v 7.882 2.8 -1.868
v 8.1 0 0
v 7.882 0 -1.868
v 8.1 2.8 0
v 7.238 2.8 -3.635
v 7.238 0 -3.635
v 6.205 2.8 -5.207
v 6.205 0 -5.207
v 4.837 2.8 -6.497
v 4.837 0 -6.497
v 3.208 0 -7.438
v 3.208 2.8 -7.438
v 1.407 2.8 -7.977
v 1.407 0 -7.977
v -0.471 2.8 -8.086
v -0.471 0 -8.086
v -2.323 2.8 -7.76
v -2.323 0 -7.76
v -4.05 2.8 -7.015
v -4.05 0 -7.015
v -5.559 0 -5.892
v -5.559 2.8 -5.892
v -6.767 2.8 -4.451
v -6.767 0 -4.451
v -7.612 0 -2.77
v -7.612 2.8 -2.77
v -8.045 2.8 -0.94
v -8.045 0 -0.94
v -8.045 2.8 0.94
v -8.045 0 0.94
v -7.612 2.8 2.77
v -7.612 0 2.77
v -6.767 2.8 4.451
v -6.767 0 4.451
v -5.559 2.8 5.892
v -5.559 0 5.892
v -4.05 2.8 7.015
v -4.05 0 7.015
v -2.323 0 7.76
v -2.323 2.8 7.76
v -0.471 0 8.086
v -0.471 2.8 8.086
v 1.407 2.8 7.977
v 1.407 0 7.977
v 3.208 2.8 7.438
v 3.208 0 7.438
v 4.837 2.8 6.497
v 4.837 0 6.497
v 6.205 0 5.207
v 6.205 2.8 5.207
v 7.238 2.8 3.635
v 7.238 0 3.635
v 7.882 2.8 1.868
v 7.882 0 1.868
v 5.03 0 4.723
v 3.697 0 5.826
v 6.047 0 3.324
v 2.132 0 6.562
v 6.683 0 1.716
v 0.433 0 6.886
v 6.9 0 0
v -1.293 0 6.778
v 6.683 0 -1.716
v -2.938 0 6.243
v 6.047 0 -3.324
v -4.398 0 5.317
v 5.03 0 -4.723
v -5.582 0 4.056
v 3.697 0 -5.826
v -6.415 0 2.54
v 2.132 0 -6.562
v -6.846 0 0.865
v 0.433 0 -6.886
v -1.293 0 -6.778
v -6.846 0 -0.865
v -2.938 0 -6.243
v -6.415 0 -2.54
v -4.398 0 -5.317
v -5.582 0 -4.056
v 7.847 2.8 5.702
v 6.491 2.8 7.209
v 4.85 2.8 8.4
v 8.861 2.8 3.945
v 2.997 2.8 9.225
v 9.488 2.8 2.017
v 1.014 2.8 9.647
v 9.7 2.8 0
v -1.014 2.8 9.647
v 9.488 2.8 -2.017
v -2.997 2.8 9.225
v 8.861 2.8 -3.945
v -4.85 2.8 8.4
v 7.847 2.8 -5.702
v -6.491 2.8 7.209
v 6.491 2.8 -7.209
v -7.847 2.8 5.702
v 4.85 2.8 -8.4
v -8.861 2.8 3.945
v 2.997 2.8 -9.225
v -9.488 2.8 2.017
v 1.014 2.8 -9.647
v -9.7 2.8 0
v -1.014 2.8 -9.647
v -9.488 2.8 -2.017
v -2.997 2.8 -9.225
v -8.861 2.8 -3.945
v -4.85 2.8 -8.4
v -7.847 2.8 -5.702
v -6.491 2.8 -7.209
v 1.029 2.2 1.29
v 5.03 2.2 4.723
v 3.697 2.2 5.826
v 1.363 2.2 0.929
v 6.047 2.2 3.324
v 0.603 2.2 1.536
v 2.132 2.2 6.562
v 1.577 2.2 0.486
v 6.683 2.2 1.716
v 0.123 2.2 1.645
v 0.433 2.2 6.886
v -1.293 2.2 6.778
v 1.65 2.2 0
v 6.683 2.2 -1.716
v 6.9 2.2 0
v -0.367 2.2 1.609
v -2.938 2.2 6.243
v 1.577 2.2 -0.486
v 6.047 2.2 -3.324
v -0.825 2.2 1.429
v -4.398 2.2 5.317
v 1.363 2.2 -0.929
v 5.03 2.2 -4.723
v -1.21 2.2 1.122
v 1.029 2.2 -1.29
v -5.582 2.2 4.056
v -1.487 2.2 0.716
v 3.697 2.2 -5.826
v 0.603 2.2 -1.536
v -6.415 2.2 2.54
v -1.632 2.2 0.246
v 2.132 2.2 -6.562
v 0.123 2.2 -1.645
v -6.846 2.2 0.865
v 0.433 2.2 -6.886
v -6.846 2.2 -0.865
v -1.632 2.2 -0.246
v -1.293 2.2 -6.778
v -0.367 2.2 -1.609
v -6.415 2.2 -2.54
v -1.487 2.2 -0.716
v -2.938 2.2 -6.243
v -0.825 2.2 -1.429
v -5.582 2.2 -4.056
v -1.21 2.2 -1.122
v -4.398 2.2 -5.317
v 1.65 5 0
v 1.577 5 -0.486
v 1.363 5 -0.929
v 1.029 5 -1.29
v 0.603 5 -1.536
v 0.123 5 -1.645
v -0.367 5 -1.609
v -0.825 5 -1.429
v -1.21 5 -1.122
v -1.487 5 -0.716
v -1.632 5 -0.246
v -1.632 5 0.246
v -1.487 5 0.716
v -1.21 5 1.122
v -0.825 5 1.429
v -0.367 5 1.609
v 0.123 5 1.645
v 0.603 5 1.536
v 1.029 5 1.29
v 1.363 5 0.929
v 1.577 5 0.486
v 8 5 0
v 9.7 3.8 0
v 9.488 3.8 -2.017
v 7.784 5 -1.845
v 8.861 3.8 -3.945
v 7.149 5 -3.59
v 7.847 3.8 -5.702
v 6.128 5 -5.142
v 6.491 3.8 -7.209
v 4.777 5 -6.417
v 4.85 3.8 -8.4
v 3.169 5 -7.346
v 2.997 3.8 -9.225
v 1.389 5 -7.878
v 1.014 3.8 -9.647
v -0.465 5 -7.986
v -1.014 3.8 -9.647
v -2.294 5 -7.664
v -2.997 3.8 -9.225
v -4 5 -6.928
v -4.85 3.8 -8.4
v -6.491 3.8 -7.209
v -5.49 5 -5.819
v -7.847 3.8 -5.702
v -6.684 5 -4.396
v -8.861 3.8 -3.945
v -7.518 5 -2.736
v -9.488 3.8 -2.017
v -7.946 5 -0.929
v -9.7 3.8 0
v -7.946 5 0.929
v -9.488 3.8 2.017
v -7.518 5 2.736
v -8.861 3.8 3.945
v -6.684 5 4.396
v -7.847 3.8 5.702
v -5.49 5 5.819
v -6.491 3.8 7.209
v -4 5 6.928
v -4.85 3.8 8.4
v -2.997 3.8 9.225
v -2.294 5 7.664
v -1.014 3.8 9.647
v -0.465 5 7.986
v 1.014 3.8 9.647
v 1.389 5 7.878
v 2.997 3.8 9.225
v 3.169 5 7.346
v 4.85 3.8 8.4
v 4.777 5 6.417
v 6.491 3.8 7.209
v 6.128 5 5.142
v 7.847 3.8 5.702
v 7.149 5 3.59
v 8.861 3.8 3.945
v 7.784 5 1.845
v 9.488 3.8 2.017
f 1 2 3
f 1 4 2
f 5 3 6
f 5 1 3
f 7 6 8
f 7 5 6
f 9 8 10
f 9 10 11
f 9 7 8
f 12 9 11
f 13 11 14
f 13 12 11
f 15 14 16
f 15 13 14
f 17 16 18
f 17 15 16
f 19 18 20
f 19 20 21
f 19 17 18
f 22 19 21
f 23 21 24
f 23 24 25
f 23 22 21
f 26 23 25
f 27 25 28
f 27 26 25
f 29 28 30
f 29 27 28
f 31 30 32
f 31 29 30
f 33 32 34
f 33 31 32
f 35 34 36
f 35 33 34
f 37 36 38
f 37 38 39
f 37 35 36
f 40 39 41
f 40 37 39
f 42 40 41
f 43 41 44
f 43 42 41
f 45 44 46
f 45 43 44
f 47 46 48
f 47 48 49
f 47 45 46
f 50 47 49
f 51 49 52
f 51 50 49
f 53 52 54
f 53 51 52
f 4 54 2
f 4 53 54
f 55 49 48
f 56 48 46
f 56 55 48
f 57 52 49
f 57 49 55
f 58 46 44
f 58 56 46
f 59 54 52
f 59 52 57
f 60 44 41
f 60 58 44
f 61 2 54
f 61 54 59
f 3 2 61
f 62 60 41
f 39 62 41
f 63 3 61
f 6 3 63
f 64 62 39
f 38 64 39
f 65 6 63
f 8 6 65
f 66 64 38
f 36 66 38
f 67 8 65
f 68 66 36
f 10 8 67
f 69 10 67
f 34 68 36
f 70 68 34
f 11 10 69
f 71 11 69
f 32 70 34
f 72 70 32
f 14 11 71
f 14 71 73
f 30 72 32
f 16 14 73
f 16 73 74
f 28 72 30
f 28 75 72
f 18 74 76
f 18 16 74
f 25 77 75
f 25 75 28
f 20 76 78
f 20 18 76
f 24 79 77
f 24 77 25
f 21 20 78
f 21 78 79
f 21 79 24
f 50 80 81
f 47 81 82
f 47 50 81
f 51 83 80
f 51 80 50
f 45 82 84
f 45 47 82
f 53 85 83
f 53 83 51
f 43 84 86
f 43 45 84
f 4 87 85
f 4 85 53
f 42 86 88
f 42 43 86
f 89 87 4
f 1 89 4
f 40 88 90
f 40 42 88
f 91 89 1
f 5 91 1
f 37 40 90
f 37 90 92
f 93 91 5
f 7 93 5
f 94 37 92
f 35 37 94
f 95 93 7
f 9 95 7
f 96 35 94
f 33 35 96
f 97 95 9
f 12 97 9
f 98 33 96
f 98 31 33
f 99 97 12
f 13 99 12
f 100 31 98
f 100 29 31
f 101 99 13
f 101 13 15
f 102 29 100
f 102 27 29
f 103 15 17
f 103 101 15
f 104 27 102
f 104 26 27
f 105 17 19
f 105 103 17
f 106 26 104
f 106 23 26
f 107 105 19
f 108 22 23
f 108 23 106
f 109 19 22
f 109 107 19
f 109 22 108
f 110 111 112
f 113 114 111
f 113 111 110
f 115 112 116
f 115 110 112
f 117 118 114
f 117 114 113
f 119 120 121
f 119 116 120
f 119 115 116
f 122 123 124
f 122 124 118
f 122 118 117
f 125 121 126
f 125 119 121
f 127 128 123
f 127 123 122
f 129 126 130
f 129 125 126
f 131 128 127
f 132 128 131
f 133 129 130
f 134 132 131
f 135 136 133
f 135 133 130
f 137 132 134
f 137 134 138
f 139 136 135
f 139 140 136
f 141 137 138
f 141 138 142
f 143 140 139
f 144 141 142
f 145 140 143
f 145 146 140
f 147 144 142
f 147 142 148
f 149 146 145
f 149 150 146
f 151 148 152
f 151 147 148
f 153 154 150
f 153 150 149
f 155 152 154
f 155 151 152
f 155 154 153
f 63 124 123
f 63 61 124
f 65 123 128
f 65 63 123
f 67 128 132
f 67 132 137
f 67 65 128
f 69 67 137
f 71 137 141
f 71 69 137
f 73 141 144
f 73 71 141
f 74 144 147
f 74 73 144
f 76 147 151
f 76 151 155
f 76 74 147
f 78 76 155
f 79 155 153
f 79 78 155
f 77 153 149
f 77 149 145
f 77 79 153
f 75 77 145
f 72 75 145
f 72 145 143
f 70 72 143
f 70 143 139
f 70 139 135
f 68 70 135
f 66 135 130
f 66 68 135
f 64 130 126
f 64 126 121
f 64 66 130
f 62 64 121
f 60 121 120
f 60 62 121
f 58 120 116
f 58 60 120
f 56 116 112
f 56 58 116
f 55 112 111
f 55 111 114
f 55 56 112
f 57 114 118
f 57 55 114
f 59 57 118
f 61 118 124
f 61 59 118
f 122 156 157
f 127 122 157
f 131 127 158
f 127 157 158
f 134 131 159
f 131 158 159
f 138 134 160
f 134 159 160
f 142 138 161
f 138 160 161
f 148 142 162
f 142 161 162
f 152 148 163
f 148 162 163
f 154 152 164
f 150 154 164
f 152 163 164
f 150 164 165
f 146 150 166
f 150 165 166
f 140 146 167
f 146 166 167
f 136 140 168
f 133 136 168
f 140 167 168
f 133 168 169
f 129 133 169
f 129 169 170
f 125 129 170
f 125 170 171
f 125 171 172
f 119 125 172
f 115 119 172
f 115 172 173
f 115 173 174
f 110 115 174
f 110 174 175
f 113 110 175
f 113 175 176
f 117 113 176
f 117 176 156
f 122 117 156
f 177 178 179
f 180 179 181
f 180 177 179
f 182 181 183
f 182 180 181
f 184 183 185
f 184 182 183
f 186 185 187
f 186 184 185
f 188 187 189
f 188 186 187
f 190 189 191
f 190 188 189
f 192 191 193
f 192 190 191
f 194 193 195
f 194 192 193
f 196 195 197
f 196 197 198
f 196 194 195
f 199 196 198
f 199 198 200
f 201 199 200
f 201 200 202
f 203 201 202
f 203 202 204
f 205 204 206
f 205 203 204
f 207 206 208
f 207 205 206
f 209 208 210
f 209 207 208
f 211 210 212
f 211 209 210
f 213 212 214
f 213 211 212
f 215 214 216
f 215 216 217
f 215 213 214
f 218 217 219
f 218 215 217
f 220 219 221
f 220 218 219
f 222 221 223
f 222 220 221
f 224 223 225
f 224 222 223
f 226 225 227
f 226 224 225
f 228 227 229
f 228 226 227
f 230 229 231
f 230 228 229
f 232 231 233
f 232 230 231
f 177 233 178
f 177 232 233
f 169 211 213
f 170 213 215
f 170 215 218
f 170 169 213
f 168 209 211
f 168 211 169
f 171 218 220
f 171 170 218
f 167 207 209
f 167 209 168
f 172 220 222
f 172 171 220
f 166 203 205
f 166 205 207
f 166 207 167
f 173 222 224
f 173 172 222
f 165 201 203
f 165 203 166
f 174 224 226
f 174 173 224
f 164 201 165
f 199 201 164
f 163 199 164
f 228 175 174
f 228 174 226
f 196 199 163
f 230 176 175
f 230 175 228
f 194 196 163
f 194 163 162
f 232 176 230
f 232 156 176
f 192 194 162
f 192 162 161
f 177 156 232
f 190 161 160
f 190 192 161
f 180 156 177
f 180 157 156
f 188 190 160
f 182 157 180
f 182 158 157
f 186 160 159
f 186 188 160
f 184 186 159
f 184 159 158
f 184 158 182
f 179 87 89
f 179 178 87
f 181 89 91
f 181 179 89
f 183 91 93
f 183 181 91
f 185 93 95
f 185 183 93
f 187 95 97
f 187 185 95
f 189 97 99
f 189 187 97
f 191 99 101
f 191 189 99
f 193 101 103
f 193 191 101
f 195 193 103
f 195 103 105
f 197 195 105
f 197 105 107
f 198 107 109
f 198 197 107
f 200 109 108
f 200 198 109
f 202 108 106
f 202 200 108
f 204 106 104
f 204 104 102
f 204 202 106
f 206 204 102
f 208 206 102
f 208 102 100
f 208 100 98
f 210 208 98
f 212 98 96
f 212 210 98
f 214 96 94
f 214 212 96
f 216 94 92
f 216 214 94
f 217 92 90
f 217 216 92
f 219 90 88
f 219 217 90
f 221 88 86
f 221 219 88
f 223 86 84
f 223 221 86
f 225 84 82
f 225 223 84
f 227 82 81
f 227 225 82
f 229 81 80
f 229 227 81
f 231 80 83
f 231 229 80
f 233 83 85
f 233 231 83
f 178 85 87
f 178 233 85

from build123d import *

# Parameters (mm, degrees)
SKETCH2_R          = 1.65
CUT_EXTRUDE1_DEPTH = 10


with BuildPart() as part:
    # Sketch1 → Revolve1 (revolve)
    with BuildSketch(Plane.XY):
        Polygon((0, 2.2), (6.9, 2.2), (6.9, 0), (8.1, 0), (8.1, 2.8), (9.7, 2.8), (9.7, 3.8), (8, 5), (0, 5), align=None)
    revolve(axis=Axis((0, 0, 0), (0, 1, 0)))

    # Sketch2 → Cut-Extrude1 (cut)
    with BuildSketch(Plane(origin=(0, 5, 0), x_dir=(1, 0, 0), z_dir=(0, 1, 0))):
        Circle(SKETCH2_R)
    extrude(amount=-CUT_EXTRUDE1_DEPTH, mode=Mode.SUBTRACT)


solid = part.part
